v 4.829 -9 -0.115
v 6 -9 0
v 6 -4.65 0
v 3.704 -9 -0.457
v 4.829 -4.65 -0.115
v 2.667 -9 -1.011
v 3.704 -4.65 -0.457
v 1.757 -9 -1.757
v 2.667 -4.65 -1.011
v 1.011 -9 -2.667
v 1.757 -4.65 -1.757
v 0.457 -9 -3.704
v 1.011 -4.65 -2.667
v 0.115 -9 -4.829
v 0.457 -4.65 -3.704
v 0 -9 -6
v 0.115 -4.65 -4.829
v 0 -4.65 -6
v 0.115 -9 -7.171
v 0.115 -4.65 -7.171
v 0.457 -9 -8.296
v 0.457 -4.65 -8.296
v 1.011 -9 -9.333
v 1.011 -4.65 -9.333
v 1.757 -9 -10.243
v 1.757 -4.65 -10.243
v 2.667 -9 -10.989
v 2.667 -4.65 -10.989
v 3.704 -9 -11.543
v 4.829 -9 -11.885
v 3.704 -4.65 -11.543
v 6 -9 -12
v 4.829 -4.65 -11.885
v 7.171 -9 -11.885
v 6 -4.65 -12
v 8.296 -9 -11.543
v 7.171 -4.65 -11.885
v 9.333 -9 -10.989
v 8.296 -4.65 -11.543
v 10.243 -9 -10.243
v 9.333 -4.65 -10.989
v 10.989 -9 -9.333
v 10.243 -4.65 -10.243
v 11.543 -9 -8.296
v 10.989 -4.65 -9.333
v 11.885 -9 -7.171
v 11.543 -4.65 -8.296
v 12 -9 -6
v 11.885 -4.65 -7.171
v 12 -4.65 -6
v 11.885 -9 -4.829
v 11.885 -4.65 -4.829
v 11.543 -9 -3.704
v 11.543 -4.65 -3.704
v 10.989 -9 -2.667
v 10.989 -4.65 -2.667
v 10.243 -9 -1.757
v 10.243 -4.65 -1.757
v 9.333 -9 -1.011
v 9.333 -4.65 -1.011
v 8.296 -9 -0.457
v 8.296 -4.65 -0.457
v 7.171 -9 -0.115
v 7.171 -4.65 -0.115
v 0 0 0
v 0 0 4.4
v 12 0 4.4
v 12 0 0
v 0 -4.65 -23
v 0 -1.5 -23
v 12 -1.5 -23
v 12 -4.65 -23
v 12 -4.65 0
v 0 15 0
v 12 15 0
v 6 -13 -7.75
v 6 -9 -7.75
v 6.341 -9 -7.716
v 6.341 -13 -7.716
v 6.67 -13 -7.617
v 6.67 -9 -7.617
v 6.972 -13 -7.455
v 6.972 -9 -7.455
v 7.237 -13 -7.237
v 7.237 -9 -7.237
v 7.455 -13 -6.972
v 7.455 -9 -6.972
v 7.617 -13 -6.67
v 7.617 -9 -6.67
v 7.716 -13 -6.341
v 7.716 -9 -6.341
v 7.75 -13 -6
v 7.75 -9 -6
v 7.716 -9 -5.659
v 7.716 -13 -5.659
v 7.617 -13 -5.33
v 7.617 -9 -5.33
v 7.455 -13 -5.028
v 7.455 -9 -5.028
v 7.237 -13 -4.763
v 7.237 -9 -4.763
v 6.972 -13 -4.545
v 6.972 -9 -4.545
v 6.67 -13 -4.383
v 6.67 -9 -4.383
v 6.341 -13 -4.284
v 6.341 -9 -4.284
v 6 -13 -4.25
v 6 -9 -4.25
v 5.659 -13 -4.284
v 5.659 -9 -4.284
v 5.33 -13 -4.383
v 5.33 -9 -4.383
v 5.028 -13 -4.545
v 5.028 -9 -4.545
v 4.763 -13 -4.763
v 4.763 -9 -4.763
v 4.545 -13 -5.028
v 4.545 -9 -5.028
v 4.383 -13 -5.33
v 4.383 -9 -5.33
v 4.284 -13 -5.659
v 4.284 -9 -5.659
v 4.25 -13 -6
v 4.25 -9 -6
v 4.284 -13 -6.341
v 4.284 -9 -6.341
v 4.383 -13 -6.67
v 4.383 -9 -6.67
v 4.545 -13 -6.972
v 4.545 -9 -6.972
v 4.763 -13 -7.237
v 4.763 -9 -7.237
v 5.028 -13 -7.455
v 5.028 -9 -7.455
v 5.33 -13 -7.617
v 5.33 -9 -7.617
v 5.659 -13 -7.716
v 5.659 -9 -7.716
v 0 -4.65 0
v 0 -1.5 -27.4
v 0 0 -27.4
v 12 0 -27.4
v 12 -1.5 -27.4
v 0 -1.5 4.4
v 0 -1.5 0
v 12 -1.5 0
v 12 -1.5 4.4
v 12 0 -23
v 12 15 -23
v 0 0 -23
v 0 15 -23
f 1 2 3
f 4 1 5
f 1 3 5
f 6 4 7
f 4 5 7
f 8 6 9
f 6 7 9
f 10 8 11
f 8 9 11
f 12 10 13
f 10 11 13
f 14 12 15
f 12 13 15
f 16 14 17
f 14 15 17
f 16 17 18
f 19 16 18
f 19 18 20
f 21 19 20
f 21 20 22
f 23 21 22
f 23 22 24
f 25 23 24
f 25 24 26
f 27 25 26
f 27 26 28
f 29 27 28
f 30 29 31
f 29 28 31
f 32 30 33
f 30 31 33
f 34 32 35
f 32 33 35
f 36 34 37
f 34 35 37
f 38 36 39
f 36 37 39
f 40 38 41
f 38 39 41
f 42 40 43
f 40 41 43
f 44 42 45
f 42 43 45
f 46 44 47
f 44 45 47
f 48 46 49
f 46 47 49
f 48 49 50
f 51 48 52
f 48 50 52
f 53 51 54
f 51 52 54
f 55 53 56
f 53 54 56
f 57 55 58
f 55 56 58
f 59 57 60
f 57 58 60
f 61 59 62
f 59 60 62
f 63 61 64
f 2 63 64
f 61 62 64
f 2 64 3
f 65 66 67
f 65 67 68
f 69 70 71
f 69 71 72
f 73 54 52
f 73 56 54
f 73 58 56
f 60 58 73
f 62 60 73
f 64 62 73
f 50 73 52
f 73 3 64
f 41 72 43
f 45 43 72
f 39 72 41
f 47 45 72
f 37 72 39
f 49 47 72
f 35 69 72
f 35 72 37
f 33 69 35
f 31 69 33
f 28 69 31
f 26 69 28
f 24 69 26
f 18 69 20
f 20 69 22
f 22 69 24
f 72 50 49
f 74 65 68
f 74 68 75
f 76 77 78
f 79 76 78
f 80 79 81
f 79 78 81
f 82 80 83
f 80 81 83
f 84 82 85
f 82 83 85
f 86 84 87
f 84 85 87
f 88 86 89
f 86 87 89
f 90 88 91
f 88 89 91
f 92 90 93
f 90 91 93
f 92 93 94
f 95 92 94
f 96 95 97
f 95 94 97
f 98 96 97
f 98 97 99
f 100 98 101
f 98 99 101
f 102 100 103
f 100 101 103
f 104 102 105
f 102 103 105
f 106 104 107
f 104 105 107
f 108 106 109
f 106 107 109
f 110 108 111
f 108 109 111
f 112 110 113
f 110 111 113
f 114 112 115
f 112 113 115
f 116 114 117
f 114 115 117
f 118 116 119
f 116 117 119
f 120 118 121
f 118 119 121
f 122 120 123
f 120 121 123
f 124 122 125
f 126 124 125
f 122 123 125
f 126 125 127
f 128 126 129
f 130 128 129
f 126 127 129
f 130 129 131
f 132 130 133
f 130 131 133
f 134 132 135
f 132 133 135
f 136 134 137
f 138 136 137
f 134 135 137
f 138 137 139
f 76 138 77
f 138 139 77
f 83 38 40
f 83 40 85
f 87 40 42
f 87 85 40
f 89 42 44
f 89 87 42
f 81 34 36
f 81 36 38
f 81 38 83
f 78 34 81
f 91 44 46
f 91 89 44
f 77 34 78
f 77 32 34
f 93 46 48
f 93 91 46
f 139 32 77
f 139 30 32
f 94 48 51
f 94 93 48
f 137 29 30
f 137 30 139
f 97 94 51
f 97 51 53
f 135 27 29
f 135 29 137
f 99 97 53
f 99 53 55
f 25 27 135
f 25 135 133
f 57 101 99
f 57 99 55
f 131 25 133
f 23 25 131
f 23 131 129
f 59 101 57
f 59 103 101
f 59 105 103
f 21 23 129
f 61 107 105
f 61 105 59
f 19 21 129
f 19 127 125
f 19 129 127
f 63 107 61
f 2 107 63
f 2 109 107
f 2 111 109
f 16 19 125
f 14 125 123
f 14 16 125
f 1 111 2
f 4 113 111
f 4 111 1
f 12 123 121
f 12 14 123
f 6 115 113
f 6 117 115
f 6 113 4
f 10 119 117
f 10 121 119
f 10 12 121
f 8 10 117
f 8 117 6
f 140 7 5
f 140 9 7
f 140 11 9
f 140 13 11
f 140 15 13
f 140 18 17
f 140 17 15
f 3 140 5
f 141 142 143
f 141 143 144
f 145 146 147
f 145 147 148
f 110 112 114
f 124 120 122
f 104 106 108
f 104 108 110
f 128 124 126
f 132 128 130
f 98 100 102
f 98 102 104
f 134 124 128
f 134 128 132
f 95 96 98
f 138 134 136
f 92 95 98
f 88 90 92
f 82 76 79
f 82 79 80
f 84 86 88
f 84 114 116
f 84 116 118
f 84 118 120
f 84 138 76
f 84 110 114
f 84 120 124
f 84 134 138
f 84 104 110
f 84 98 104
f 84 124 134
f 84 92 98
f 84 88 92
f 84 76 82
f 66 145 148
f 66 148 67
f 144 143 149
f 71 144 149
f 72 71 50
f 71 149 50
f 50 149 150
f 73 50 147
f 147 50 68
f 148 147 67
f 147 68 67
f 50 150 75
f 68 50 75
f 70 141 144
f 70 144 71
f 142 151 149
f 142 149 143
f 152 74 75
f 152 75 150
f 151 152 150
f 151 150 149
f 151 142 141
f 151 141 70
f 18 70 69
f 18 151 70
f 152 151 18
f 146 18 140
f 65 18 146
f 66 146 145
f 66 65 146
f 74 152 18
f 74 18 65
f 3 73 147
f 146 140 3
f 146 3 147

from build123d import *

# Parameters (mm, degrees)
EXTRUDE_1_DEPTH = 12
SKETCH_2_R      = 6
EXTRUDE_2_DEPTH = 4.35
SKETCH_3_R      = 1.75
EXTRUDE_3_DEPTH = 4


with BuildPart() as part:
    # 草图1 → 凸台-拉伸1 (new body)
    with BuildSketch(Plane(origin=(0, 0, 0), x_dir=(0, 0, -1), z_dir=(1, 0, 0))):
        Polygon((0, 0), (0, 15), (23, 15), (23, 0), (27.4, 0), (27.4, -1.5), (23, -1.5), (23, -4.65), (0, -4.65), (0, -1.5), (-4.4, -1.5), (-4.4, 0), align=None)
    extrude(amount=EXTRUDE_1_DEPTH)

    # 草图2 → 凸台-拉伸2 (add)
    with BuildSketch(Plane(origin=(0, -4.65, 0), x_dir=(-1, 0, 0), z_dir=(0, -1, 0))):
        with Locations(Location((-6, 6, 0), (0, 0, 270))):
            Circle(SKETCH_2_R)
    extrude(amount=EXTRUDE_2_DEPTH)

    # 草图3 → 凸台-拉伸3 (add)
    with BuildSketch(Plane.XZ.offset(9)):
        with Locations(Location((6, -6, 0), (0, 0, 270))):
            Circle(SKETCH_3_R)
    extrude(amount=EXTRUDE_3_DEPTH)


solid = part.part
